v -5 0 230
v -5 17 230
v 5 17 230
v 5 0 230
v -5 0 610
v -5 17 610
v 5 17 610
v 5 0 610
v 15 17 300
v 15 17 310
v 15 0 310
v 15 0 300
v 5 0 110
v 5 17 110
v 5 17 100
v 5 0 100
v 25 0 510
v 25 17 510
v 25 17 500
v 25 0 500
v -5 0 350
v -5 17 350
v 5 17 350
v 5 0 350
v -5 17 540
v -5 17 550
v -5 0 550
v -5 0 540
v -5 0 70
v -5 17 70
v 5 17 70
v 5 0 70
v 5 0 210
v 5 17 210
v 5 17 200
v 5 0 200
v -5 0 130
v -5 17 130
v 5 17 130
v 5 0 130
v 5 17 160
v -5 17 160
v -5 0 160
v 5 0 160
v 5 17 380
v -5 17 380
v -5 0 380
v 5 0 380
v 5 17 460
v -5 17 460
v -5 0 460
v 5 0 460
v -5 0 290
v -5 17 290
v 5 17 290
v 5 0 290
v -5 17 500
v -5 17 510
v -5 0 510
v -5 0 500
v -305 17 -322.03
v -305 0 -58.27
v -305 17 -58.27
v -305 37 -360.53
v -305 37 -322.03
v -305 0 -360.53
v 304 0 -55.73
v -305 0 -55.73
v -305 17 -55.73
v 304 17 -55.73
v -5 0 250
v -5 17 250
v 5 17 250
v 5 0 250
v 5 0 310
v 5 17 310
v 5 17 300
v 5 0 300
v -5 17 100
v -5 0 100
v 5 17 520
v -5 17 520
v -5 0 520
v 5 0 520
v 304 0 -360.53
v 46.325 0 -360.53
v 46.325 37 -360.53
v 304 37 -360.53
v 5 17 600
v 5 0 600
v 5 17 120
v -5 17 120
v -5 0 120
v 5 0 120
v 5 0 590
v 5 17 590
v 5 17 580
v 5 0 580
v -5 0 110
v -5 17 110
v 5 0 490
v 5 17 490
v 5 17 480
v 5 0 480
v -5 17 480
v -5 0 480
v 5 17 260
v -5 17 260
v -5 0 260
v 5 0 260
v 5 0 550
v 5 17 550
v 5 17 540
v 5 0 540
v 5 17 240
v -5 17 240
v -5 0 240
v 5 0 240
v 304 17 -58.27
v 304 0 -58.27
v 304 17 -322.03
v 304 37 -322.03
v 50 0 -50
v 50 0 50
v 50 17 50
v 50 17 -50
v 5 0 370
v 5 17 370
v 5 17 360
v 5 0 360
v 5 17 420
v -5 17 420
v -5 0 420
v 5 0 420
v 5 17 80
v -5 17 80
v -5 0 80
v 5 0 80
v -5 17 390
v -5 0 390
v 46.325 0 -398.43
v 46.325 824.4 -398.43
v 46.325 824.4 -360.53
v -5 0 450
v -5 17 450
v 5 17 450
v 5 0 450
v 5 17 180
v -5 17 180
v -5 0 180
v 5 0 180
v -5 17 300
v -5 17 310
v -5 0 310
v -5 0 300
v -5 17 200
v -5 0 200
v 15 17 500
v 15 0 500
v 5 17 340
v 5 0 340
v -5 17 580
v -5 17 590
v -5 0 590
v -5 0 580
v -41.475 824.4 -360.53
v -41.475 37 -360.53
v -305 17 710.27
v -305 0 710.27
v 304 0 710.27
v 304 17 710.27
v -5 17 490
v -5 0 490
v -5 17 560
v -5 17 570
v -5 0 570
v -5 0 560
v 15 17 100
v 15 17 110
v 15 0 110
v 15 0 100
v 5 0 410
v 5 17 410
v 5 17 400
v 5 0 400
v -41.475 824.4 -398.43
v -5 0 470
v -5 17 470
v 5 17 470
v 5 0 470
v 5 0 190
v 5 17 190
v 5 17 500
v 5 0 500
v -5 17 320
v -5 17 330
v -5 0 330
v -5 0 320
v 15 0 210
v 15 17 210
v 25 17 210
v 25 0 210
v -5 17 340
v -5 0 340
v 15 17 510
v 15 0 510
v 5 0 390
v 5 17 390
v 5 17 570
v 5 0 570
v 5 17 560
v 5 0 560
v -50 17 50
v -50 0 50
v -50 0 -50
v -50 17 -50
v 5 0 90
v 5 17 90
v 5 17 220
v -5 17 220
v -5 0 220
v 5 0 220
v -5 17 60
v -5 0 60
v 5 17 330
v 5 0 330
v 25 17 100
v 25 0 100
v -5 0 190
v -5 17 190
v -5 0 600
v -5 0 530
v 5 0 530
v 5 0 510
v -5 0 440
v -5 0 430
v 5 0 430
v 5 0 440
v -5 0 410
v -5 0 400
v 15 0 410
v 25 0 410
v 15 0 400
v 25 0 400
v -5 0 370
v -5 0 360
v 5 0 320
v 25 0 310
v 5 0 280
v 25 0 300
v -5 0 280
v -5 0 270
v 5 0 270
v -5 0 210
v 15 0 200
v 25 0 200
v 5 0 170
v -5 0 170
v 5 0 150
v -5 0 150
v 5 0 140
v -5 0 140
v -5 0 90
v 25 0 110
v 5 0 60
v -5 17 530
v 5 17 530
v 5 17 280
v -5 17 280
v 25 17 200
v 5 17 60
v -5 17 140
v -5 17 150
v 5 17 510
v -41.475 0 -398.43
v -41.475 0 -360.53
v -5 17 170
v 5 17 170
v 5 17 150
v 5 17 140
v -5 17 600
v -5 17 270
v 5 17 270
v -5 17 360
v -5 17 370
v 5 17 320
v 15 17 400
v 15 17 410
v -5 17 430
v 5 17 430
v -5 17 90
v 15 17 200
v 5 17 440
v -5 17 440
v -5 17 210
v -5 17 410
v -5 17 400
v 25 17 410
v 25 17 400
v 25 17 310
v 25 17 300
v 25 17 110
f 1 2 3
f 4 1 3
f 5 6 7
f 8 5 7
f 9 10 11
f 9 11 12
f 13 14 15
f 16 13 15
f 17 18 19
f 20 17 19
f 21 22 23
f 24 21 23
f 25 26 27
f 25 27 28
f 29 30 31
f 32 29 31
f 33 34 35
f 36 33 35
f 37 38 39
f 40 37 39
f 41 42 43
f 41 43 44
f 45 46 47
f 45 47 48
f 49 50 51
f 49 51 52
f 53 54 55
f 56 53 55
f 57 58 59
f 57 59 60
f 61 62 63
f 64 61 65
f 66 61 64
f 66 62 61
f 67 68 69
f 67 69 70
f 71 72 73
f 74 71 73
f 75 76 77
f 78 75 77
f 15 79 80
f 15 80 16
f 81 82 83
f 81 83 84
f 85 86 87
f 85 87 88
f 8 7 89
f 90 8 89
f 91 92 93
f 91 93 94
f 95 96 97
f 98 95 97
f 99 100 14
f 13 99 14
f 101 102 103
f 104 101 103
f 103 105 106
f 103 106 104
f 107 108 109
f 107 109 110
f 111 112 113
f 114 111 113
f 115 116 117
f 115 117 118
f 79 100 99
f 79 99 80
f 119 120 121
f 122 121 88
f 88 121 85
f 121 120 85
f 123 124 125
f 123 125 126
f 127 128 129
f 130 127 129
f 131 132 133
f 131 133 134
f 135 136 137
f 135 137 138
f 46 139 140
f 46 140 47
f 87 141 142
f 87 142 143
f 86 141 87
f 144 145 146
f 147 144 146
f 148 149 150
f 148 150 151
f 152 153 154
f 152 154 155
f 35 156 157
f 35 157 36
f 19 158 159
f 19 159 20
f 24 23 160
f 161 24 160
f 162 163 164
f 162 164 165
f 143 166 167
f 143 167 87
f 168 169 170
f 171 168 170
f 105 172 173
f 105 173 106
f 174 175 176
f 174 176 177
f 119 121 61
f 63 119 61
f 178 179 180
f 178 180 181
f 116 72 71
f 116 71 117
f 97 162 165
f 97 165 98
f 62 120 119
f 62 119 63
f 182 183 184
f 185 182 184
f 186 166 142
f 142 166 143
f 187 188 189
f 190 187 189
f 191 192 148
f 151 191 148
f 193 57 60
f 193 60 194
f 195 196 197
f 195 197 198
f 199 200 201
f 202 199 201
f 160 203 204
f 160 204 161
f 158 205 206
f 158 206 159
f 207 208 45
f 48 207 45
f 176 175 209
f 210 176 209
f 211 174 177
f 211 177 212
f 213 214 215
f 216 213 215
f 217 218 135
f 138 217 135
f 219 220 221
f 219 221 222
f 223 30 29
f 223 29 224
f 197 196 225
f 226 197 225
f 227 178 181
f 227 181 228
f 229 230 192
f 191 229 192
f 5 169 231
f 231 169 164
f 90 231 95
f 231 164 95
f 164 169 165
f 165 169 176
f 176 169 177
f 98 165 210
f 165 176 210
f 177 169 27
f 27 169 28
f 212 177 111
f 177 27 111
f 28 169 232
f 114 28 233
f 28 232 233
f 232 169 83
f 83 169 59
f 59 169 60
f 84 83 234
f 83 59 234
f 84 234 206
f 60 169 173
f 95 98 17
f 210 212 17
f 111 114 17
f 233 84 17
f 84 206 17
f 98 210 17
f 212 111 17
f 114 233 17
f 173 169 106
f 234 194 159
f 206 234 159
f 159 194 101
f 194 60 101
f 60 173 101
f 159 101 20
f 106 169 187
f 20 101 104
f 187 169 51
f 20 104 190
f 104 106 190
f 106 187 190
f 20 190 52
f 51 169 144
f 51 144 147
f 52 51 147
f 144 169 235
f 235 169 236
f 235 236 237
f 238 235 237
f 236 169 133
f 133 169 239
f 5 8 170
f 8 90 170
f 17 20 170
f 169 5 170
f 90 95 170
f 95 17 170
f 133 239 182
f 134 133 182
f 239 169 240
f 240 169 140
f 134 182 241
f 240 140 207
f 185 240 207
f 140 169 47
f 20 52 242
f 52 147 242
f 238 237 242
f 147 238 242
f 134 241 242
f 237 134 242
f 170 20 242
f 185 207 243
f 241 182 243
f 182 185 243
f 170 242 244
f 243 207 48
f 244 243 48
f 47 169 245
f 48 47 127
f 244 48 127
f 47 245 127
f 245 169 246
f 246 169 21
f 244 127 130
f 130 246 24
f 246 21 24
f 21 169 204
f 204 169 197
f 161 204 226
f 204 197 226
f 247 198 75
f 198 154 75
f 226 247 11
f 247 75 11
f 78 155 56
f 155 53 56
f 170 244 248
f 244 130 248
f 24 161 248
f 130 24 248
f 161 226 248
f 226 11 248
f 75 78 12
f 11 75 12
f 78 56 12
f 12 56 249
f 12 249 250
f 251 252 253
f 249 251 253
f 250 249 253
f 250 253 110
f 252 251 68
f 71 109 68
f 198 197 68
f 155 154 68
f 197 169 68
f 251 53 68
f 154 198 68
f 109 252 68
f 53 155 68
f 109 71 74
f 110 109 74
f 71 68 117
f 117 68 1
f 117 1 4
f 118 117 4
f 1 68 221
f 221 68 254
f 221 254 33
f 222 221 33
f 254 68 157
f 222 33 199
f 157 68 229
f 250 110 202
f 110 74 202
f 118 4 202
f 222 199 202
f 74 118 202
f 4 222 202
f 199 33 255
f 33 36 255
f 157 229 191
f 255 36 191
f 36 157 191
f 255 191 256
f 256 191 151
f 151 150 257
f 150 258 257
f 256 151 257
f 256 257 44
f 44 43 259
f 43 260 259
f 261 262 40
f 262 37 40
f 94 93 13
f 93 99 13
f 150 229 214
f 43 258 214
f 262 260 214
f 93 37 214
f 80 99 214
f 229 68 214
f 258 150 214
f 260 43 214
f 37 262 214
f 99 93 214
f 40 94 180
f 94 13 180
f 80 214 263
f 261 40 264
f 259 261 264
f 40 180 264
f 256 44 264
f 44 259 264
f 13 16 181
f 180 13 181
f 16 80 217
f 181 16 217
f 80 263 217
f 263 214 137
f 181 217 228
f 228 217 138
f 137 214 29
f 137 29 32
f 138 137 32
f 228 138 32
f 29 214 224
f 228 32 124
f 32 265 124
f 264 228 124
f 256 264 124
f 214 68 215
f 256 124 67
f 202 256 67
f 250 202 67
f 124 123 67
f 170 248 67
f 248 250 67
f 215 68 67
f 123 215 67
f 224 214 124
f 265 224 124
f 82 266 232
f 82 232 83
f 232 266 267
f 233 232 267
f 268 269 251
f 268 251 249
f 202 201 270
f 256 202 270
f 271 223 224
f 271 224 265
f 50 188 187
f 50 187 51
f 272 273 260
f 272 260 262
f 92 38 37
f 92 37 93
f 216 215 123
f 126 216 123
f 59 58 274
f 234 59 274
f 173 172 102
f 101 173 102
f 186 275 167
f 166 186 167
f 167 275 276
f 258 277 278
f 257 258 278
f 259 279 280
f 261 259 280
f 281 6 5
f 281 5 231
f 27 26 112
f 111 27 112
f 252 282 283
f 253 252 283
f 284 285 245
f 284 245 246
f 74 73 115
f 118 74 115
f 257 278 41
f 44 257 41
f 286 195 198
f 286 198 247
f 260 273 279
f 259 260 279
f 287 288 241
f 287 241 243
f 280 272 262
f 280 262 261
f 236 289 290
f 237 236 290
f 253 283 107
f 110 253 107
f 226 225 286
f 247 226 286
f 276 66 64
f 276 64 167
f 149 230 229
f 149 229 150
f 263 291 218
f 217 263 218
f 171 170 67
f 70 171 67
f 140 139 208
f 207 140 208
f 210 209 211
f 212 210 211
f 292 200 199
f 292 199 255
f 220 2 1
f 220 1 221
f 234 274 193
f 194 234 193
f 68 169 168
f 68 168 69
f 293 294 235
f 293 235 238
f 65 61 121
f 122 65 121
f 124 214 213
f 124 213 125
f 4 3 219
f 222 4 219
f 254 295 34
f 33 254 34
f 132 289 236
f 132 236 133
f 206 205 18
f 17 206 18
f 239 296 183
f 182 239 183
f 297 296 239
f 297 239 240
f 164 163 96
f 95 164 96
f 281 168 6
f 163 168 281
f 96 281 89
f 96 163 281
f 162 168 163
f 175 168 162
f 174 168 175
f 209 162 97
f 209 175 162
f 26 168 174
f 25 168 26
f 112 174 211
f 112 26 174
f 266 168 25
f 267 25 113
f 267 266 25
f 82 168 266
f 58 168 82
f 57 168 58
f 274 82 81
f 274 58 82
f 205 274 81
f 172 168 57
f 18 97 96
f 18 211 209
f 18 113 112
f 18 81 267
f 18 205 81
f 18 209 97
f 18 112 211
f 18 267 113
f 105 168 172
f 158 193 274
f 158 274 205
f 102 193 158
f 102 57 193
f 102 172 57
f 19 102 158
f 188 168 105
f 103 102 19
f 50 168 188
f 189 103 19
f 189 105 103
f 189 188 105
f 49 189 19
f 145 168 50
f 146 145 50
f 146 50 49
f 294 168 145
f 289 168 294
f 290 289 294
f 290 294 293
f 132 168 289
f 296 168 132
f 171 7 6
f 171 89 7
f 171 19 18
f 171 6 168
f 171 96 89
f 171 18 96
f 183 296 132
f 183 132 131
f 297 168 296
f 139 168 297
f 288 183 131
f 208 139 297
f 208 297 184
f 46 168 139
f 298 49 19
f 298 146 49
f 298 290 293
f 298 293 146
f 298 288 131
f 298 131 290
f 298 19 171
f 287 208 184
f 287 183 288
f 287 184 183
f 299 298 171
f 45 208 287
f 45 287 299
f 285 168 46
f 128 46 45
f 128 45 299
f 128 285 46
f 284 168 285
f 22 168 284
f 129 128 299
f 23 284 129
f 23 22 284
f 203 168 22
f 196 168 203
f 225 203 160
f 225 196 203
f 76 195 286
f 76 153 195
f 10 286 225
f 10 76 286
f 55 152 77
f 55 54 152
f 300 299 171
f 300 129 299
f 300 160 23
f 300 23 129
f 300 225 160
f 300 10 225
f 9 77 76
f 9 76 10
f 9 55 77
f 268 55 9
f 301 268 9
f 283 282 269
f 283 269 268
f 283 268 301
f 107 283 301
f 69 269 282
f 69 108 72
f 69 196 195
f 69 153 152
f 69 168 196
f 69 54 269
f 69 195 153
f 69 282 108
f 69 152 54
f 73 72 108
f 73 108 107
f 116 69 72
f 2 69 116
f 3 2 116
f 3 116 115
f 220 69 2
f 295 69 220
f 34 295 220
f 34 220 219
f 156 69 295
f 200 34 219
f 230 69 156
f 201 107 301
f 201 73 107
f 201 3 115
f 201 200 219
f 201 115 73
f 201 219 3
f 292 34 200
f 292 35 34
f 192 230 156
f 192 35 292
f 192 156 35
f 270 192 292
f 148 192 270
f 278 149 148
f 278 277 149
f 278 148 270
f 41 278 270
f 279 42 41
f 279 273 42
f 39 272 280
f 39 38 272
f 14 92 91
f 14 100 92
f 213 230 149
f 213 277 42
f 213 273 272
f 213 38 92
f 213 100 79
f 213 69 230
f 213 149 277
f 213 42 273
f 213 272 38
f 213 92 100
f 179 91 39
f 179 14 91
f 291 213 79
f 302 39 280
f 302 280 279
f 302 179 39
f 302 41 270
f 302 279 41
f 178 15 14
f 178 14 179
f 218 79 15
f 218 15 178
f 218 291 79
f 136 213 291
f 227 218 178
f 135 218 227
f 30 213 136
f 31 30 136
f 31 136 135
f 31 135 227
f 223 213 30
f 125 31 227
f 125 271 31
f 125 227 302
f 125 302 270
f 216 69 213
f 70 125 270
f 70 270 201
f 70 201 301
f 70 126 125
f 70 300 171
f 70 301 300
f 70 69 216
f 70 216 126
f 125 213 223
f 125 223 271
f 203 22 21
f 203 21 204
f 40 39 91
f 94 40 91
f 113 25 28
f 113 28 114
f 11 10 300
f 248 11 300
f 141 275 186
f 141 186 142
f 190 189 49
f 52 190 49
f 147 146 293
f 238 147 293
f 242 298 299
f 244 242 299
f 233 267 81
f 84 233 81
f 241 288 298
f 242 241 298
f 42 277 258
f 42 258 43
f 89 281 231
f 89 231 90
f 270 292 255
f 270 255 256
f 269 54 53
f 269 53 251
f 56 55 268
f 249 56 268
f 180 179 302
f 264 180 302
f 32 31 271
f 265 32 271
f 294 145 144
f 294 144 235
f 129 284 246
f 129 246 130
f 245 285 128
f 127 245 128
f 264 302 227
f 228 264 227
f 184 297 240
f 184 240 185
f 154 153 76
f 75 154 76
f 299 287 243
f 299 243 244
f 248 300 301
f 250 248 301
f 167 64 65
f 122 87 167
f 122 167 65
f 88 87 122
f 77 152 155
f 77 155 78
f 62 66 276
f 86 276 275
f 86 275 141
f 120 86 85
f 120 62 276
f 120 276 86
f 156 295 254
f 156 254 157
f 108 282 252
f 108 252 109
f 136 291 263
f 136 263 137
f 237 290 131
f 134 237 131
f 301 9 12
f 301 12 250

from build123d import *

# Parameters (mm, degrees)
SKETCH1_W           = 609
SKETCH1_H           = 766
SKETCH1_W_2         = 10
SKETCH1_H_2         = 10
SKETCH1_W_3         = 100
SKETCH1_H_3         = 100
BOSS_EXTRUDE1_DEPTH = 17
SKETCH2_W           = 609
SKETCH2_H           = 302.26
BOSS_EXTRUDE2_DEPTH = 17
SKETCH3_W           = 609
SKETCH3_H           = 38.5
BOSS_EXTRUDE3_DEPTH = 20
SKETCH4_W           = 87.8
SKETCH4_H           = 37.9
BOSS_EXTRUDE4_DEPTH = 824.4


with BuildPart() as part:
    # Sketch1 → Boss-Extrude1 (new body)
    with BuildSketch(Plane(origin=(0, 0, 0), x_dir=(1, 0, 0), z_dir=(0, 1, 0))):
        with Locations((-0.5, -327.27)):
            Rectangle(SKETCH1_W, SKETCH1_H)
        with Locations((0, -85)):
            Rectangle(SKETCH1_W_2, SKETCH1_H_2, mode=Mode.SUBTRACT)
        Rectangle(SKETCH1_W_3, SKETCH1_H_3, mode=Mode.SUBTRACT)
        with Locations((0, -65)):
            Rectangle(SKETCH1_W_2, SKETCH1_H_2, mode=Mode.SUBTRACT)
        with Locations((0, -105)):
            Rectangle(SKETCH1_W_2, SKETCH1_H_2, mode=Mode.SUBTRACT)
        with Locations((0, -125)):
            Rectangle(SKETCH1_W_2, SKETCH1_H_2, mode=Mode.SUBTRACT)
        with Locations((0, -145)):
            Rectangle(SKETCH1_W_2, SKETCH1_H_2, mode=Mode.SUBTRACT)
        with Locations((0, -165)):
            Rectangle(SKETCH1_W_2, SKETCH1_H_2, mode=Mode.SUBTRACT)
        with Locations((0, -185)):
            Rectangle(SKETCH1_W_2, SKETCH1_H_2, mode=Mode.SUBTRACT)
        with Locations((0, -205)):
            Rectangle(SKETCH1_W_2, SKETCH1_H_2, mode=Mode.SUBTRACT)
        with Locations((0, -225)):
            Rectangle(SKETCH1_W_2, SKETCH1_H_2, mode=Mode.SUBTRACT)
        with Locations((0, -245)):
            Rectangle(SKETCH1_W_2, SKETCH1_H_2, mode=Mode.SUBTRACT)
        with Locations((0, -265)):
            Rectangle(SKETCH1_W_2, SKETCH1_H_2, mode=Mode.SUBTRACT)
        with Locations((0, -285)):
            Rectangle(SKETCH1_W_2, SKETCH1_H_2, mode=Mode.SUBTRACT)
        with Locations((0, -305)):
            Rectangle(SKETCH1_W_2, SKETCH1_H_2, mode=Mode.SUBTRACT)
        with Locations((0, -325)):
            Rectangle(SKETCH1_W_2, SKETCH1_H_2, mode=Mode.SUBTRACT)
        with Locations((0, -345)):
            Rectangle(SKETCH1_W_2, SKETCH1_H_2, mode=Mode.SUBTRACT)
        with Locations((0, -365)):
            Rectangle(SKETCH1_W_2, SKETCH1_H_2, mode=Mode.SUBTRACT)
        with Locations((0, -385)):
            Rectangle(SKETCH1_W_2, SKETCH1_H_2, mode=Mode.SUBTRACT)
        with Locations((0, -405)):
            Rectangle(SKETCH1_W_2, SKETCH1_H_2, mode=Mode.SUBTRACT)
        with Locations((0, -425)):
            Rectangle(SKETCH1_W_2, SKETCH1_H_2, mode=Mode.SUBTRACT)
        with Locations((0, -445)):
            Rectangle(SKETCH1_W_2, SKETCH1_H_2, mode=Mode.SUBTRACT)
        with Locations((0, -465)):
            Rectangle(SKETCH1_W_2, SKETCH1_H_2, mode=Mode.SUBTRACT)
        with Locations((0, -485)):
            Rectangle(SKETCH1_W_2, SKETCH1_H_2, mode=Mode.SUBTRACT)
        with Locations((0, -505)):
            Rectangle(SKETCH1_W_2, SKETCH1_H_2, mode=Mode.SUBTRACT)
        with Locations((0, -525)):
            Rectangle(SKETCH1_W_2, SKETCH1_H_2, mode=Mode.SUBTRACT)
        with Locations((0, -545)):
            Rectangle(SKETCH1_W_2, SKETCH1_H_2, mode=Mode.SUBTRACT)
        with Locations((0, -565)):
            Rectangle(SKETCH1_W_2, SKETCH1_H_2, mode=Mode.SUBTRACT)
        with Locations((0, -585)):
            Rectangle(SKETCH1_W_2, SKETCH1_H_2, mode=Mode.SUBTRACT)
        with Locations((0, -605)):
            Rectangle(SKETCH1_W_2, SKETCH1_H_2, mode=Mode.SUBTRACT)
        with Locations((20, -105)):
            Rectangle(SKETCH1_W_2, SKETCH1_H_2, mode=Mode.SUBTRACT)
        with Locations((20, -205)):
            Rectangle(SKETCH1_W_2, SKETCH1_H_2, mode=Mode.SUBTRACT)
        with Locations((20, -305)):
            Rectangle(SKETCH1_W_2, SKETCH1_H_2, mode=Mode.SUBTRACT)
        with Locations((20, -405)):
            Rectangle(SKETCH1_W_2, SKETCH1_H_2, mode=Mode.SUBTRACT)
        with Locations((20, -505)):
            Rectangle(SKETCH1_W_2, SKETCH1_H_2, mode=Mode.SUBTRACT)
    extrude(amount=BOSS_EXTRUDE1_DEPTH)


with BuildPart() as body_2:
    # Sketch2 → Boss-Extrude2 (new body)
    with BuildSketch(Plane(origin=(0, 0, 0), x_dir=(-1, 0, 0), z_dir=(0, -1, 0))):
        with Locations((0.5, 209.4)):
            Rectangle(SKETCH2_W, SKETCH2_H)
    extrude(amount=-BOSS_EXTRUDE2_DEPTH)

    # Sketch3 → Boss-Extrude3 (add)
    with BuildSketch(Plane(origin=(0, 17, 0), x_dir=(1, 0, 0), z_dir=(0, 1, 0))):
        with Locations((-0.5, 341.28)):
            Rectangle(SKETCH3_W, SKETCH3_H)
    extrude(amount=BOSS_EXTRUDE3_DEPTH)

    # Sketch4 → Boss-Extrude4 (add)
    with BuildSketch(Plane.XZ):
        with Locations((2.425, -379.48)):
            Rectangle(SKETCH4_W, SKETCH4_H)
    extrude(amount=-BOSS_EXTRUDE4_DEPTH)


solid = Compound([part.part, body_2.part])
